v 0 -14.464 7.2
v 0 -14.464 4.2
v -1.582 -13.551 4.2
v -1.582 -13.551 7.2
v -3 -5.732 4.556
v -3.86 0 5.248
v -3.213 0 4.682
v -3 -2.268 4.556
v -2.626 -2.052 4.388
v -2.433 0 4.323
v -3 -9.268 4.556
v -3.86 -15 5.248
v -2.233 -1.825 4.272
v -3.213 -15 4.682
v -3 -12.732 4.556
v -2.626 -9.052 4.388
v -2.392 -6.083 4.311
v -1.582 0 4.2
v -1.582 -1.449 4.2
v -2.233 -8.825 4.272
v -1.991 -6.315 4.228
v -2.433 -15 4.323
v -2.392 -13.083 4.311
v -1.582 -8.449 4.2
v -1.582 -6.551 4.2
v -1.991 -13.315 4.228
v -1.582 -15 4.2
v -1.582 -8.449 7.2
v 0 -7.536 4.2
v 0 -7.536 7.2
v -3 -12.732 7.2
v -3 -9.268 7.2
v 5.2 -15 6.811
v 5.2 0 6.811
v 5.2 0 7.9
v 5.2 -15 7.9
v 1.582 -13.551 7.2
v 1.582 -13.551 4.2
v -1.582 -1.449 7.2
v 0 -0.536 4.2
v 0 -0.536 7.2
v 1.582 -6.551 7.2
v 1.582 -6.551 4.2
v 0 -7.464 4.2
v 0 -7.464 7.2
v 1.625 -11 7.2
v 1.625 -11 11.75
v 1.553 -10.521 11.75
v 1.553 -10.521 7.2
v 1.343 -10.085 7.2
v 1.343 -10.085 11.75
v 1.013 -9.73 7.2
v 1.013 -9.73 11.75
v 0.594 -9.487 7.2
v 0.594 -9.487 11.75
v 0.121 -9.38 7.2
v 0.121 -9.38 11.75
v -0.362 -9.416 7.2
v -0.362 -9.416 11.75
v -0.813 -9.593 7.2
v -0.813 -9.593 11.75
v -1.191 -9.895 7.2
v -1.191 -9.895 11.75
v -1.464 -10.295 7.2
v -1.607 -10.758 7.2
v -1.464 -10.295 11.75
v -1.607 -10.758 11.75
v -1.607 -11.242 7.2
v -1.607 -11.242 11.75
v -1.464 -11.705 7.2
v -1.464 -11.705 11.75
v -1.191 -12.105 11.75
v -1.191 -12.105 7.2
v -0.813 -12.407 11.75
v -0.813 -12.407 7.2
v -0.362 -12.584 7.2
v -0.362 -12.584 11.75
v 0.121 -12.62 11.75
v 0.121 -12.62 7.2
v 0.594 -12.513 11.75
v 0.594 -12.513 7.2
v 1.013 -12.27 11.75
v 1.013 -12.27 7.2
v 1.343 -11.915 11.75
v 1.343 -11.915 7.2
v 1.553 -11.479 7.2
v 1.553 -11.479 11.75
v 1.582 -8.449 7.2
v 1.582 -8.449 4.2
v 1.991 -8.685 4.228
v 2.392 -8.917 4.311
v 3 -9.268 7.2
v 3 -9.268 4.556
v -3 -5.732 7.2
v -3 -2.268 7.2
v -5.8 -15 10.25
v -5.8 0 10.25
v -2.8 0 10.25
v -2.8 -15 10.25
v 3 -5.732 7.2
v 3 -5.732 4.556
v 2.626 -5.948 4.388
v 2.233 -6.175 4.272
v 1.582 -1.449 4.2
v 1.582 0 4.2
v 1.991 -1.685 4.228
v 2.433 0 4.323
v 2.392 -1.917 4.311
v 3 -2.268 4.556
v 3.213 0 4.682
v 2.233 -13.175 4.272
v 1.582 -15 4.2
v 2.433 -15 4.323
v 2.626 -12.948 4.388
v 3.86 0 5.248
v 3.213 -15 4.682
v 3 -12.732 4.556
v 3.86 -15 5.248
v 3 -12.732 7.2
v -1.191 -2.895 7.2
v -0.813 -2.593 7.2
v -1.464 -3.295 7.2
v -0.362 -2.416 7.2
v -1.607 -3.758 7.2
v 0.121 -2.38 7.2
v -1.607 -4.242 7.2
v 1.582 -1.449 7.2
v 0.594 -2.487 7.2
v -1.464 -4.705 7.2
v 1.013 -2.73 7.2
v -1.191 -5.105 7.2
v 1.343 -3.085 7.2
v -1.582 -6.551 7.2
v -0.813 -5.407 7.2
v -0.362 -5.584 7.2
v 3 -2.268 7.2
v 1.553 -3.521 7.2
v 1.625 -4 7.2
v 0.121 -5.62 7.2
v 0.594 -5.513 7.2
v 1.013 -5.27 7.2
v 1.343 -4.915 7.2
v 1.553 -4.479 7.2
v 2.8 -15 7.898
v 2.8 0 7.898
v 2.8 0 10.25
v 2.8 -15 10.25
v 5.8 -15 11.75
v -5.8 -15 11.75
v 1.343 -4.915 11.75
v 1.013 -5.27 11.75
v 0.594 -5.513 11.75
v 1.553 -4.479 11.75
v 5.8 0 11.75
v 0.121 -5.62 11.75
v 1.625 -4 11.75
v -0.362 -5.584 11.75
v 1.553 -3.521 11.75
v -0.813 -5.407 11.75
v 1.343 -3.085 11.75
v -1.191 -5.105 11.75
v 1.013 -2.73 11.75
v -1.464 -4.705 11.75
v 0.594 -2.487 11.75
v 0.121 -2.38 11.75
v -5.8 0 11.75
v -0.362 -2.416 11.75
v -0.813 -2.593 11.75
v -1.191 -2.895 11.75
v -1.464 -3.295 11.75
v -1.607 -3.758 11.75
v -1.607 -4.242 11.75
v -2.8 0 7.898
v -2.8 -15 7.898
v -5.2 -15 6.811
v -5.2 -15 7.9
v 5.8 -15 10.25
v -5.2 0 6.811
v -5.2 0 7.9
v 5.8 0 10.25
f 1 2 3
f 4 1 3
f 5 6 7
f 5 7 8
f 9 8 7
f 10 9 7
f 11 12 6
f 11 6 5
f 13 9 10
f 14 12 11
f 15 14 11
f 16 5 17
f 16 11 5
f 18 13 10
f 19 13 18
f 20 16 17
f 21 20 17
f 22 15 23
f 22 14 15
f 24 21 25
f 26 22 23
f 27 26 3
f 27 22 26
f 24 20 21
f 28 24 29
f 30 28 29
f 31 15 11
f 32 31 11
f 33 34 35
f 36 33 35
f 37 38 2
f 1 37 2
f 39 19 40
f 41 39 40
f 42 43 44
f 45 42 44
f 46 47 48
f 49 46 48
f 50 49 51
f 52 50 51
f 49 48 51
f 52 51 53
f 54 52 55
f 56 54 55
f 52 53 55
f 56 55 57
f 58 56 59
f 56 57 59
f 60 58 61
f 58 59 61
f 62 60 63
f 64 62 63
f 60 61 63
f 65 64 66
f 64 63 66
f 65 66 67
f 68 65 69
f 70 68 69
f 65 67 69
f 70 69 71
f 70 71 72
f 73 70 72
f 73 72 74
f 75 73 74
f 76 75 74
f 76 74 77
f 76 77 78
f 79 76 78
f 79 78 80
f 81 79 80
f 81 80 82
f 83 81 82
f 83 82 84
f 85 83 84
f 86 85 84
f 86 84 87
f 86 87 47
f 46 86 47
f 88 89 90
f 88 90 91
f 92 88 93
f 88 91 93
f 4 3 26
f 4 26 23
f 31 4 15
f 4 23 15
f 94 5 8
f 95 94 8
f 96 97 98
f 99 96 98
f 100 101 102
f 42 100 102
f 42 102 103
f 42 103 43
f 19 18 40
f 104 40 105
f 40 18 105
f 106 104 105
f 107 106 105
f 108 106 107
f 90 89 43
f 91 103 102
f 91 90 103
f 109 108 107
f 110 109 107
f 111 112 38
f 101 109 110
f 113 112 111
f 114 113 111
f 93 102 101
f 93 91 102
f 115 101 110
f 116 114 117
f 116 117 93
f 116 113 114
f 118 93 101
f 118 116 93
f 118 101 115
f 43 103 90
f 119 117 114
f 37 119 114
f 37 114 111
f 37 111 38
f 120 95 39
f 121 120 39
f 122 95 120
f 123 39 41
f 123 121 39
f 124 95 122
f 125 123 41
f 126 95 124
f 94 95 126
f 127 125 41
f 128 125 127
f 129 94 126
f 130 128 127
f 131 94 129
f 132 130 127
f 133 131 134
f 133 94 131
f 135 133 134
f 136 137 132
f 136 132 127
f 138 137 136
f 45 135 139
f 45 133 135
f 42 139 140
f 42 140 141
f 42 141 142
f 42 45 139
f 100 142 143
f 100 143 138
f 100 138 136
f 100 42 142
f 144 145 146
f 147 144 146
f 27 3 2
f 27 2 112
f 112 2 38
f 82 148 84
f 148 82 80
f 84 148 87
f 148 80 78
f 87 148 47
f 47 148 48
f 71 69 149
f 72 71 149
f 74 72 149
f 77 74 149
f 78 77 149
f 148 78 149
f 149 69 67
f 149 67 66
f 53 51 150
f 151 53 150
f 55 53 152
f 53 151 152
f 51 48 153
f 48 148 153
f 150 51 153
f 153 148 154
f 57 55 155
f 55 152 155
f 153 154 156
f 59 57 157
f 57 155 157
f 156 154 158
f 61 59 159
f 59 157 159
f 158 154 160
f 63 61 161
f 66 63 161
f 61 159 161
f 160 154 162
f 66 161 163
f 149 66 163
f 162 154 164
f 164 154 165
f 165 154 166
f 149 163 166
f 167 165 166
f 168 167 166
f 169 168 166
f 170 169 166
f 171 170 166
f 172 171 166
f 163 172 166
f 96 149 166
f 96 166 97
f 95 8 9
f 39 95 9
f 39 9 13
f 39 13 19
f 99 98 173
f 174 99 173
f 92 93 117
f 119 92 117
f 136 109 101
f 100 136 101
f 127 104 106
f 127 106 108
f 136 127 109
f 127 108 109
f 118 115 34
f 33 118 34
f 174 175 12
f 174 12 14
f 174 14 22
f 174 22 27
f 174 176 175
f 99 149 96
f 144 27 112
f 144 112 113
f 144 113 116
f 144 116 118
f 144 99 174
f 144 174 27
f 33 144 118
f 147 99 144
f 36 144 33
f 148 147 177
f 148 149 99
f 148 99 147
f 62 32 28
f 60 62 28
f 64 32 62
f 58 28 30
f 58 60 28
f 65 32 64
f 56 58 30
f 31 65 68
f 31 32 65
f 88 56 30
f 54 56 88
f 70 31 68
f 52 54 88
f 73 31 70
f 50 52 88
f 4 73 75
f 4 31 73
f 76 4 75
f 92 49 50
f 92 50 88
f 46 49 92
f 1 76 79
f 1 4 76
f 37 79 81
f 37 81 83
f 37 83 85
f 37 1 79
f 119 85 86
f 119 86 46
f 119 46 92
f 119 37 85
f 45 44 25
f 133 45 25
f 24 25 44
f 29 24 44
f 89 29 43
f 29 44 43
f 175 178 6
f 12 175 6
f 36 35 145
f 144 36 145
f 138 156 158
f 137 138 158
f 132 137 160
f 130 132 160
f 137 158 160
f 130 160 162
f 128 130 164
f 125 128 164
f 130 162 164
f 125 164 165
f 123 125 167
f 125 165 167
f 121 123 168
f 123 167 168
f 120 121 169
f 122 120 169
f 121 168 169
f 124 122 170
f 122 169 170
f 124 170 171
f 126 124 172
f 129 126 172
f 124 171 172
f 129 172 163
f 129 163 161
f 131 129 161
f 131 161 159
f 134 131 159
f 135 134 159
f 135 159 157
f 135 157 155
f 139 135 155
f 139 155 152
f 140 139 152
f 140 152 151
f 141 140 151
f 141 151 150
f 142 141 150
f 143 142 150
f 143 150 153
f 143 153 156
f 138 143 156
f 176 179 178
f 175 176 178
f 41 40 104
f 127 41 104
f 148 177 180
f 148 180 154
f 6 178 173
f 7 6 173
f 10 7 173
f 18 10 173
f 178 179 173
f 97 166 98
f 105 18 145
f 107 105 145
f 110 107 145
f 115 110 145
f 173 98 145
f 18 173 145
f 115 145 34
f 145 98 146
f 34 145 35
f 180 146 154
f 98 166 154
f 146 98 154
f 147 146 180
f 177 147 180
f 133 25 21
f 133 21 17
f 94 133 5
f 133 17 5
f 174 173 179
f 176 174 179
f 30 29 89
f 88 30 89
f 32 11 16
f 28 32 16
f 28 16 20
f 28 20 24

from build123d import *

# Parameters (mm, degrees)
F1_DEPTH = 15
F2_R     = 3
F3_R     = 1.625
F4_DEPTH = 6
F6_DEPTH = 3


# Not quite as in the source:
# - a feature names something its author has since deleted; it is built from what else it names


with BuildPart() as f1:
    # F0 (on Front) → F1 (new body)
    with BuildSketch(Plane.XZ):
        Polygon((2.8, 7.8979998849), (2.8, 10), (2.8, 10.25), (5.8, 10.25), (5.8, 11.75), (0, 11.75), (-5.8, 11.75), (-5.8, 10.25), (-2.8, 10.25), (-2.8, 10), (-2.8, 7.8979998849), (-5.2, 7.8997776918), (-5.2, 6.8109772229), (-2.9620195233, 4.2), (0, 4.2), (2.9620195233, 4.2), (5.2, 6.8109772229), (5.2, 7.8997776918), align=None)
    extrude(amount=F1_DEPTH)

    # F2
    f2_edges = [f1.edges().sort_by_distance(p)[0] for p in [
        (-2.96202, -7.5, 4.2),
        (2.96202, -7.5, 4.2),
    ]]
    fillet(f2_edges, radius=F2_R)

    # F3 (on face) → F4 (cut)
    with BuildSketch(Plane.XY.offset(11.75)):
        with Locations((0, -4)):
            Circle(F3_R)
        with Locations((0, -11)):
            Circle(F3_R)
    extrude(amount=-F4_DEPTH, mode=Mode.SUBTRACT)

    # F5 (on face) → F6 (cut)
    with BuildSketch(Plane(origin=(0, 0, 4.2), x_dir=(1, 0, 0), z_dir=(0, 0, -1))):
        Polygon((3, 12.7320508076), (1.5822147558, 13.5506094999), (1.5822147558, 8.4493905001), (3, 9.2679491924), align=None)
        Polygon((-1.5822147558, 8.4493905001), (-1.5822147558, 13.5506094999), (-3, 12.7320508076), (-3, 9.2679491924), align=None)
        Polygon((-1.5822147558, 1.4493905001), (-1.5822147558, 6.5506094999), (-3, 5.7320508076), (-3, 2.2679491924), align=None)
        Polygon((3, 5.7320508076), (1.5822147558, 6.5506094999), (1.5822147558, 1.4493905001), (3, 2.2679491924), align=None)
        Polygon((1.5822147558, 13.5506094999), (0, 14.4641016151), (-1.5822147558, 13.5506094999), (-1.5822147558, 8.4493905001), (0, 7.5358983849), (1.5822147558, 8.4493905001), align=None)
        Polygon((1.5822147558, 1.4493905001), (1.5822147558, 6.5506094999), (0, 7.4641016151), (-1.5822147558, 6.5506094999), (-1.5822147558, 1.4493905001), (0, 0.5358983849), align=None)
    extrude(amount=-F6_DEPTH, mode=Mode.SUBTRACT)


solid = f1.part
